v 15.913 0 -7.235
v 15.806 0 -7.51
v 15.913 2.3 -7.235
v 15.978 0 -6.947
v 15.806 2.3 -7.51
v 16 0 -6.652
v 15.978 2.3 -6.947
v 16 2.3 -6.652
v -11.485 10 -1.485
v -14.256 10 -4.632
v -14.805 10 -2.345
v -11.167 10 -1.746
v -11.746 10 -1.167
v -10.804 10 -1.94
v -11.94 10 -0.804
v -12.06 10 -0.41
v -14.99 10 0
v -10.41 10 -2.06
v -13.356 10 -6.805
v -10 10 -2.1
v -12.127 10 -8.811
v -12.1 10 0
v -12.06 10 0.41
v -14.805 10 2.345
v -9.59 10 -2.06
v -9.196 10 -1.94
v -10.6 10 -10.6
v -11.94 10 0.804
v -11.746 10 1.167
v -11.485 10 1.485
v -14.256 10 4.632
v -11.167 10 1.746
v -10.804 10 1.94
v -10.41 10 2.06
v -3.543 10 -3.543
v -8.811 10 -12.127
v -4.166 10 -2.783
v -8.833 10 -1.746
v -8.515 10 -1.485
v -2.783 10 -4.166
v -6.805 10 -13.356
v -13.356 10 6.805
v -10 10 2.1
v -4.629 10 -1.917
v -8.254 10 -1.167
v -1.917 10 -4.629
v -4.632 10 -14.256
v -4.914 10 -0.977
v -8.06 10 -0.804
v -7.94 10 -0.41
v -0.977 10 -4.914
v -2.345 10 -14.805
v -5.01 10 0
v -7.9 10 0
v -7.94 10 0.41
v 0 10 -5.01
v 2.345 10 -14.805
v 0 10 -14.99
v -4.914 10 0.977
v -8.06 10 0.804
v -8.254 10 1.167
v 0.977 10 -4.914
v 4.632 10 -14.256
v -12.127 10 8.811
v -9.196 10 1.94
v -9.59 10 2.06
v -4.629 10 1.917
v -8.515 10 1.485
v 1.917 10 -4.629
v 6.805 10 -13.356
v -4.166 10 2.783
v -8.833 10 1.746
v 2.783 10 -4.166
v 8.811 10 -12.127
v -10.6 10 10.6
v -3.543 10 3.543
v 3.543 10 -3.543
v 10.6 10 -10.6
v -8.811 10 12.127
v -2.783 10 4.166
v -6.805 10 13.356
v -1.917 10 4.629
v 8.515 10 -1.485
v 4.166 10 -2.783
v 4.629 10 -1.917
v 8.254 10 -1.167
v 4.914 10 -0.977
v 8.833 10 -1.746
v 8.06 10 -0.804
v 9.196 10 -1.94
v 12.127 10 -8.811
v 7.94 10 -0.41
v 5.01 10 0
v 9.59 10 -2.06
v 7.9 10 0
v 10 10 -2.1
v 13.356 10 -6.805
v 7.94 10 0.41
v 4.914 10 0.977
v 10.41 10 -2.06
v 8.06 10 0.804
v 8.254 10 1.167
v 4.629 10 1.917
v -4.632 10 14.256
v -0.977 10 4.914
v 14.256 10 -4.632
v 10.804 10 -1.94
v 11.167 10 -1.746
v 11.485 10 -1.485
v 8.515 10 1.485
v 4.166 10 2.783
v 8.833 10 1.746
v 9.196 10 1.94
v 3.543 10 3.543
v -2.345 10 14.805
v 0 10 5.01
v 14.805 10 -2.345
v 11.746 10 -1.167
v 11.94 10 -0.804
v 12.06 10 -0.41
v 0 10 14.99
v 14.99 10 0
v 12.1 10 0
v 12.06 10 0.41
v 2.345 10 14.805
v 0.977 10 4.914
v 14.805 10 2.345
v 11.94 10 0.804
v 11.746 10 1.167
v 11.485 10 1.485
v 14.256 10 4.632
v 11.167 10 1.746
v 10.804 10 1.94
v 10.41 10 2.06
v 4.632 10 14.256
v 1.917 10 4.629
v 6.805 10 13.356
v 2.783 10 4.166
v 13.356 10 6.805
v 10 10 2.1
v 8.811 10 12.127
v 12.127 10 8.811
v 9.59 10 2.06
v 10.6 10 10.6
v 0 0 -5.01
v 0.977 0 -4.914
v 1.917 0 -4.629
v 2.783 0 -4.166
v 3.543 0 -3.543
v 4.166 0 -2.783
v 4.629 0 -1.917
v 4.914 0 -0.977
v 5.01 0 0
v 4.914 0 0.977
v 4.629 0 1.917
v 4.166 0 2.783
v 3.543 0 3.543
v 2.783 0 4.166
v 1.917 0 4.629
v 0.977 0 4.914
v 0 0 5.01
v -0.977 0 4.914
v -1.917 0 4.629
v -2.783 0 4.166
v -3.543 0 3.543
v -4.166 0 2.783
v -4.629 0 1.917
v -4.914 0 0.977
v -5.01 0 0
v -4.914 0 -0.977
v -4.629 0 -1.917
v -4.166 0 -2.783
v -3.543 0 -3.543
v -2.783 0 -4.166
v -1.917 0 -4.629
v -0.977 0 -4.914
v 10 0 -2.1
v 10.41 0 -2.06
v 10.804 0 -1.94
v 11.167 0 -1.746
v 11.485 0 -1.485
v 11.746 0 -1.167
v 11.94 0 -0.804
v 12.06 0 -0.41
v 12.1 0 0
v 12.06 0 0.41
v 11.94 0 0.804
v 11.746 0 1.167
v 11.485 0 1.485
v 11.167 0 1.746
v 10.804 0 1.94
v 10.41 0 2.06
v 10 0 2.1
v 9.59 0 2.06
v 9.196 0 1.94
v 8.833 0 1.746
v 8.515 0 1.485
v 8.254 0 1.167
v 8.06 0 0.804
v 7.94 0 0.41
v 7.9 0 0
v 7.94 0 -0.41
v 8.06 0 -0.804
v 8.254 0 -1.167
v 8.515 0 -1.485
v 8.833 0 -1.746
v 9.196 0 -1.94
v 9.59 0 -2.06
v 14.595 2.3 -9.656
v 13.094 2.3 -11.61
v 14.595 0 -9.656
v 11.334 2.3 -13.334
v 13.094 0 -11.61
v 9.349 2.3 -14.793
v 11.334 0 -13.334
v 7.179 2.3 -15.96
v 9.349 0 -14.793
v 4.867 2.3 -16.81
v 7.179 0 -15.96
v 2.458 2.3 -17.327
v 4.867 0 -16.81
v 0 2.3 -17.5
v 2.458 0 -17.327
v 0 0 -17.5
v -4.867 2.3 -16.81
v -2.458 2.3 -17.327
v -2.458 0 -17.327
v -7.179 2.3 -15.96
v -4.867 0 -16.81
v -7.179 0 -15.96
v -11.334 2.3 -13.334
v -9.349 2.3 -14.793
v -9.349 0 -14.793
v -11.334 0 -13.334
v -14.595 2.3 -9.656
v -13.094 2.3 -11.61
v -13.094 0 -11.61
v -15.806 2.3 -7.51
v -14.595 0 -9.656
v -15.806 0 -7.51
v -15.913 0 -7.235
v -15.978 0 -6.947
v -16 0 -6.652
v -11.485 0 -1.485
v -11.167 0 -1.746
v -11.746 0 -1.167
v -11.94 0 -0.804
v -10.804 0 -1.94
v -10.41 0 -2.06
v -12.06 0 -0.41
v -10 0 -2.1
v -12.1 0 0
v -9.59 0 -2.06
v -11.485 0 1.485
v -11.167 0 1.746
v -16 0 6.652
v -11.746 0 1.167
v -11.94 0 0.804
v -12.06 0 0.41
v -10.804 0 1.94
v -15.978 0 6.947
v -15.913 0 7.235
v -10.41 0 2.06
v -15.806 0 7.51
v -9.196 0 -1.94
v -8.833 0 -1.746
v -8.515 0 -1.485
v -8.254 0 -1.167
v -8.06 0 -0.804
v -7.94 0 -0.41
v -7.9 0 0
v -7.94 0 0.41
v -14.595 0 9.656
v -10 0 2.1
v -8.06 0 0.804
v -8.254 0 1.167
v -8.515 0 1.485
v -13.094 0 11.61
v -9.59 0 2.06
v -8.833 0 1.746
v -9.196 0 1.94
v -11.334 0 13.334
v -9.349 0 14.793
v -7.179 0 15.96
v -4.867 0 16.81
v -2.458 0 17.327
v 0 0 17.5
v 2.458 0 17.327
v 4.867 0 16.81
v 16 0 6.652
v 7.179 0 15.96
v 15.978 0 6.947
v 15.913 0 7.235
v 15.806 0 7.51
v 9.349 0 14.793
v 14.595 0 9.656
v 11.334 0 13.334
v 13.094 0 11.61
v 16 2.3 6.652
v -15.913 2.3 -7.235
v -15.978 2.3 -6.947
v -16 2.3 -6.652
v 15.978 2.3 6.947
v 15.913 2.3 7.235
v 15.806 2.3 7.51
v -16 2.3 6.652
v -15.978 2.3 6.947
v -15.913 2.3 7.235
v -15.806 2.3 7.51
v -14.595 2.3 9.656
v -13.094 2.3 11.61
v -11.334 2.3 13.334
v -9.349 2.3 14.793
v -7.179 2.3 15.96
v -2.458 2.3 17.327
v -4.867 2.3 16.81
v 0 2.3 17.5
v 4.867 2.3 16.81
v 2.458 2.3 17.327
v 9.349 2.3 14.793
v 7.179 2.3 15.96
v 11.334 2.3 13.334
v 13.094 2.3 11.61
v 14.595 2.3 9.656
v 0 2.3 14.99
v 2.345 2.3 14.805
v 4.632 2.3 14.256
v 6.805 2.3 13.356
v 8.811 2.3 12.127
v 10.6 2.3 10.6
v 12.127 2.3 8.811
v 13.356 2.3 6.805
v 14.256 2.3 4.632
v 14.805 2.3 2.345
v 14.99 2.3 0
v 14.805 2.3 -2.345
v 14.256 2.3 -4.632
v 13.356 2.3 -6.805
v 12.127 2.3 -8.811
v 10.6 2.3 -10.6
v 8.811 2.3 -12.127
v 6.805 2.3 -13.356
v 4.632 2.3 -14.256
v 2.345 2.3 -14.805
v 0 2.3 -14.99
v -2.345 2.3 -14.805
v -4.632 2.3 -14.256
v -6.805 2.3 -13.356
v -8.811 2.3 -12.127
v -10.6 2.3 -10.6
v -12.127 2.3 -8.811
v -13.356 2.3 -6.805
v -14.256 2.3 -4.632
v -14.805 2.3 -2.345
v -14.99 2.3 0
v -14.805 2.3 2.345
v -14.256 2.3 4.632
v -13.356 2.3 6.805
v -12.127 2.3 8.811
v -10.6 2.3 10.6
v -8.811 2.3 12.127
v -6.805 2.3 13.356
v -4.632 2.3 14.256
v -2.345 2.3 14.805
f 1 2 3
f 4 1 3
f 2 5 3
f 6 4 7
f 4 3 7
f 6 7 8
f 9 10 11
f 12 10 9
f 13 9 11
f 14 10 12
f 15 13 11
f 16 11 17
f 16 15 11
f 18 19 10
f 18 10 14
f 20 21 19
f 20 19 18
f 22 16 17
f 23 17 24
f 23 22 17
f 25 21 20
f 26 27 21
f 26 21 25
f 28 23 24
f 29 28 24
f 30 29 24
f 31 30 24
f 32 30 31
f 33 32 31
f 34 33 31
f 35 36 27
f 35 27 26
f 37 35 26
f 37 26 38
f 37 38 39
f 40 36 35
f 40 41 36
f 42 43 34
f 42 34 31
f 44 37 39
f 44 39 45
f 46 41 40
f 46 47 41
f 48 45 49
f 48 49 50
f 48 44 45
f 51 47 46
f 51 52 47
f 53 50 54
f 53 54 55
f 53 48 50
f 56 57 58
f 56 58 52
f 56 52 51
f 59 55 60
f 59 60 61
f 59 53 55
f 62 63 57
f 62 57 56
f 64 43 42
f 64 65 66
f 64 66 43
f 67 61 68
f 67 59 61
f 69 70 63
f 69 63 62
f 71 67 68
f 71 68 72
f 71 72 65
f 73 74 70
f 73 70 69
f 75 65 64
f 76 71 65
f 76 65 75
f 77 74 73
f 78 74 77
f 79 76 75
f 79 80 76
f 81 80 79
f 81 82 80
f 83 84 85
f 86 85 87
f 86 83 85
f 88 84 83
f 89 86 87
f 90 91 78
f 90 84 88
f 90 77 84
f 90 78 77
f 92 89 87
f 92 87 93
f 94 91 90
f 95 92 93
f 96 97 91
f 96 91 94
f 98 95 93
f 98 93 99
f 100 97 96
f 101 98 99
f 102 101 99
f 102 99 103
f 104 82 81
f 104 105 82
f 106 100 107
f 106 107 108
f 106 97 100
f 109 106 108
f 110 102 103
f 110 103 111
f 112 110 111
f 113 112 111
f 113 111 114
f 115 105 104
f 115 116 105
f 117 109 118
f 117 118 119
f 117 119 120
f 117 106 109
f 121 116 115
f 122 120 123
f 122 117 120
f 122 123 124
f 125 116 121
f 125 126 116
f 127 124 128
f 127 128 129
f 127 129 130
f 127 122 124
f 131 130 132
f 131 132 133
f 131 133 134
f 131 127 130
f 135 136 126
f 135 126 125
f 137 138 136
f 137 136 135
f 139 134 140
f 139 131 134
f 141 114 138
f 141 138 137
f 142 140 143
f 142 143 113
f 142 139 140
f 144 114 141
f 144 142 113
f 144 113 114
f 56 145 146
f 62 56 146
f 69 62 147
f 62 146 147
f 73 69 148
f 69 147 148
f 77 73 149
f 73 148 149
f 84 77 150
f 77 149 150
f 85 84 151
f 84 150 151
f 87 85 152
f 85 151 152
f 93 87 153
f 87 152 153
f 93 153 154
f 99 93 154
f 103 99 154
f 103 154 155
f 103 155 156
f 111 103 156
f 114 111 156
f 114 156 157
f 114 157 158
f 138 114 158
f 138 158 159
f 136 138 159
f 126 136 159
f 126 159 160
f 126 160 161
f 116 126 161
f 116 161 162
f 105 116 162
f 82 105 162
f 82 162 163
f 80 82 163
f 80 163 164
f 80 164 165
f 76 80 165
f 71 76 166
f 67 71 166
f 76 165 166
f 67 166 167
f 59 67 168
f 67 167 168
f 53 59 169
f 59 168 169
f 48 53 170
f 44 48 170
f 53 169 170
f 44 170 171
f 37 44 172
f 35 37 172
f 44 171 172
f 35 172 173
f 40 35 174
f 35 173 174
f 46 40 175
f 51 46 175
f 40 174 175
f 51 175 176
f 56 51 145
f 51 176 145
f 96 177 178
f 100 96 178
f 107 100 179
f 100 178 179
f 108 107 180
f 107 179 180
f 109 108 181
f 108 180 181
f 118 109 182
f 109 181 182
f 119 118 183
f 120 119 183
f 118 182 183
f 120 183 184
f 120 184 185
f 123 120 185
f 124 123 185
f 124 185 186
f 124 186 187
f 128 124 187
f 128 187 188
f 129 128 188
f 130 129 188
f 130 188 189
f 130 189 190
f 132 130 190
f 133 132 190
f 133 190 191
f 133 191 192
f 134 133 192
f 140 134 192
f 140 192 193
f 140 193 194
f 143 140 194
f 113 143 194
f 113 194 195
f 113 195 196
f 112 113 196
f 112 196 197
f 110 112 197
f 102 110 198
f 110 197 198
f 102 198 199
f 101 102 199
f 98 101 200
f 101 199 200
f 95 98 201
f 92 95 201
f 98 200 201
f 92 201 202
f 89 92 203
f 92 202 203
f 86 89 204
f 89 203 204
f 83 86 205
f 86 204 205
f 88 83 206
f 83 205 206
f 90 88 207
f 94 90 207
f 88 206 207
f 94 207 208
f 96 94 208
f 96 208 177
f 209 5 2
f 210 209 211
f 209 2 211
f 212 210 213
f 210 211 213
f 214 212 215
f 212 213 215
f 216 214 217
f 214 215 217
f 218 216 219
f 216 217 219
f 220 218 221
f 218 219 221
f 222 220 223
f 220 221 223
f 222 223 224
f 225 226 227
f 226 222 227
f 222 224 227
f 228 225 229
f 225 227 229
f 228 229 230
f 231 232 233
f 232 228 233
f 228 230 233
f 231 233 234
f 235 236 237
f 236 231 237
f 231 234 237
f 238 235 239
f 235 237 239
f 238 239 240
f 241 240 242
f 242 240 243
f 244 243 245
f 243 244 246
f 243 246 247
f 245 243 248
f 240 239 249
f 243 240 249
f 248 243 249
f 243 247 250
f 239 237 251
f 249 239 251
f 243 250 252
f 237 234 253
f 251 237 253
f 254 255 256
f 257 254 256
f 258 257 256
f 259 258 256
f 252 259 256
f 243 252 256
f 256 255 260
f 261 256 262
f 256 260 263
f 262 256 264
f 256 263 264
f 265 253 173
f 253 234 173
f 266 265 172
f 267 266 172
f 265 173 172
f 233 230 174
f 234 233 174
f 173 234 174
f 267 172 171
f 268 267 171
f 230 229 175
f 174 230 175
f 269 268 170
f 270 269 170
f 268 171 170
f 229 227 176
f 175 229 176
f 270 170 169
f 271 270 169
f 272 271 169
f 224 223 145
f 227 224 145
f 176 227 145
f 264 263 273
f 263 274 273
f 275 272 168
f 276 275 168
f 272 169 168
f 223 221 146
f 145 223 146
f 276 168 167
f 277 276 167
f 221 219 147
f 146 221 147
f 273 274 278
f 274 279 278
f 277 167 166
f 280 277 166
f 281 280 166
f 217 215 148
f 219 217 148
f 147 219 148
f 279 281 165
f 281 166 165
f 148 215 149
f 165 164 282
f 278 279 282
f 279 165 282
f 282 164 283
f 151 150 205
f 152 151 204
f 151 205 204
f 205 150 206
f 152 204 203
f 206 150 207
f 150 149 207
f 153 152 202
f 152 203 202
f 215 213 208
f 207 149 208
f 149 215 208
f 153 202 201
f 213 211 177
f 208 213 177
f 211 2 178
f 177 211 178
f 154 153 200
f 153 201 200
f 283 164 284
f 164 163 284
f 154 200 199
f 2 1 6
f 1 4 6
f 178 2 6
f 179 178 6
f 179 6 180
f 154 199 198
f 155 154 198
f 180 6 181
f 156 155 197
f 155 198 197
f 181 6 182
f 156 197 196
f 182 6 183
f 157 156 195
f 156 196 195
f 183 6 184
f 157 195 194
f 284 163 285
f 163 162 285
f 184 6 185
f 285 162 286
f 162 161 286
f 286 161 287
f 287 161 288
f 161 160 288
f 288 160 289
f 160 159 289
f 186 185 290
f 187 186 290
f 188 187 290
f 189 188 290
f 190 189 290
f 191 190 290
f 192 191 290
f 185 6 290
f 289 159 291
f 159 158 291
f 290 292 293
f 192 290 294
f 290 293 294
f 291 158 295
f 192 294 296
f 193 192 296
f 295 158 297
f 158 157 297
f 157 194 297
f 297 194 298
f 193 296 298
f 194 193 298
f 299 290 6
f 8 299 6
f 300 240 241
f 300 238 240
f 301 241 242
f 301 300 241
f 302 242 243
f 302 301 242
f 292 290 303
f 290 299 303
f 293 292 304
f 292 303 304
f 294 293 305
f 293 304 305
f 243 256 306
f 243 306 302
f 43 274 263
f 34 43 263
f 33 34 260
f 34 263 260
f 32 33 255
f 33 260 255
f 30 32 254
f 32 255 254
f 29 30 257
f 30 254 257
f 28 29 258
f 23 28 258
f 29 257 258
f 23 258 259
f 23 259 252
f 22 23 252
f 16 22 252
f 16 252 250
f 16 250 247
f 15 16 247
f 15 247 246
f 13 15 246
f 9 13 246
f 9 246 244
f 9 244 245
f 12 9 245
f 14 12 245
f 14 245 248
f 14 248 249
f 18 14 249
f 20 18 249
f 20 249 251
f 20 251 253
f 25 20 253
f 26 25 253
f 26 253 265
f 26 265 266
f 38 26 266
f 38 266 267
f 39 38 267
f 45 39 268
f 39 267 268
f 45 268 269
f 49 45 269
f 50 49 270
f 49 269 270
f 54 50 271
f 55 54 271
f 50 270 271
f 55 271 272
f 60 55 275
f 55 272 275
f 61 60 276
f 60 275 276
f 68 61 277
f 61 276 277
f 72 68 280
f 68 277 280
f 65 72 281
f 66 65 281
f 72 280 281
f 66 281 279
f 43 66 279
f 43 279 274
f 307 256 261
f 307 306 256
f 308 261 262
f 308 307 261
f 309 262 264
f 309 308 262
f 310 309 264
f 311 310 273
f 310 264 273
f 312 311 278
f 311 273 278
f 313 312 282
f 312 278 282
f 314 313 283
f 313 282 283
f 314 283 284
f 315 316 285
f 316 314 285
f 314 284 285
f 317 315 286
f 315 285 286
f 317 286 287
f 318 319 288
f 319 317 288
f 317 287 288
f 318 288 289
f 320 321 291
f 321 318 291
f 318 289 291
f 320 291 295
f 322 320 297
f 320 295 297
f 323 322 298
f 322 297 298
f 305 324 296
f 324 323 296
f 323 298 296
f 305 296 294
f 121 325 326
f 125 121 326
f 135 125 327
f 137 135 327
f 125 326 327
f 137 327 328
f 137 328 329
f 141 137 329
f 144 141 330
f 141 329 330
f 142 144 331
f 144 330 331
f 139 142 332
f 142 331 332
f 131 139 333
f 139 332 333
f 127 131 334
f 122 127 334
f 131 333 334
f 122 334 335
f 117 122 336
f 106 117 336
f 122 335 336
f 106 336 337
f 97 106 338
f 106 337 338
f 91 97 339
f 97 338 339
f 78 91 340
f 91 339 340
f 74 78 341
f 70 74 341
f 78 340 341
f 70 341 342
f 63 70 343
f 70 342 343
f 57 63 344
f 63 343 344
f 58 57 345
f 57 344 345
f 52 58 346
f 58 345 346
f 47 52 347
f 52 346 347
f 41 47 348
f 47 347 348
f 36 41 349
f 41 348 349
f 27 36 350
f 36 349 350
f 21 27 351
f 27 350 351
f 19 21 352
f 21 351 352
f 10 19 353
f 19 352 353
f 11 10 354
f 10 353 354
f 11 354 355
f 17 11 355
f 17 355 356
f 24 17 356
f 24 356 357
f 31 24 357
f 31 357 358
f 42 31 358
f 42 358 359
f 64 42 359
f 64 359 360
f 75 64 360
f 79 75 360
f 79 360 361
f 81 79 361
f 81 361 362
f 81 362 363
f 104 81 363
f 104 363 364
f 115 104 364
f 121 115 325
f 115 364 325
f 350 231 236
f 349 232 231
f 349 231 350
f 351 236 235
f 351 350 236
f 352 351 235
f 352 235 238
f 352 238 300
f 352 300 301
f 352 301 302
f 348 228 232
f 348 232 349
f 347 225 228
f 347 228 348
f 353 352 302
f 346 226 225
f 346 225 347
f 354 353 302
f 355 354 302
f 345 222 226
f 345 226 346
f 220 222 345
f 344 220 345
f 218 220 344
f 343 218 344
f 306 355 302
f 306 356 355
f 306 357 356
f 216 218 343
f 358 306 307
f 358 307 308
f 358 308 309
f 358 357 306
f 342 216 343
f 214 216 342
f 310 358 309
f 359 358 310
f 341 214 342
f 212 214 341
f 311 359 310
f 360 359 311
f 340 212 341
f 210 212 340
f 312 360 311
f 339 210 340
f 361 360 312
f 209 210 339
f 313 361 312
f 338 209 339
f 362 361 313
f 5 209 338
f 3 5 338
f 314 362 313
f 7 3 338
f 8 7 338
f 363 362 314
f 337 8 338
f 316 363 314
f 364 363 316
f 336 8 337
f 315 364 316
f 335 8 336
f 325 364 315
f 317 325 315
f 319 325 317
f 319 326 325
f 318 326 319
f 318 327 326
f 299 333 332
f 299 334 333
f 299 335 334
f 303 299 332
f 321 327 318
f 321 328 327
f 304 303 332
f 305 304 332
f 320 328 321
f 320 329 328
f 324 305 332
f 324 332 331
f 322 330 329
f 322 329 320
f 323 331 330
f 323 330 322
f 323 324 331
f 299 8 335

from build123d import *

# Parameters (mm, degrees)
SKETCH_1_R          = 17.5
EXTRUDE_1_DEPTH     = 2.3
SKETCH_2_R          = 14.99
EXTRUDE_2_DEPTH     = 7.7
CUT_EXTRUDE_1_REACH = 28.693
SKETCH_3_R          = 5.01
SKETCH_3_R_2        = 2.1
FILLET_1_R          = 2


with BuildPart() as part:
    # ｽｹｯﾁ1 → ﾎﾞｽ - 押し出し1 (new body)
    with BuildSketch(Plane(origin=(0, 0, 0), x_dir=(1, 0, 0), z_dir=(0, 1, 0))):
        with Locations(Location((0, 0, 0), (0, 0, 270))):
            Circle(SKETCH_1_R)
    extrude(amount=EXTRUDE_1_DEPTH)

    # ｽｹｯﾁ2 → ﾎﾞｽ - 押し出し2 (add)
    with BuildSketch(Plane(origin=(0, 2.3, 0), x_dir=(1, 0, 0), z_dir=(0, 1, 0))):
        with Locations(Location((0, 0, 0), (0, 0, 270))):
            Circle(SKETCH_2_R)
    extrude(amount=EXTRUDE_2_DEPTH)

    # ｶｯﾄ - 押し出し1: up to this face of the body (flat: up to its plane)
    cut_extrude_1_end = Plane(part.part.faces().sort_by_distance((0, 10, 0))[0])
    # ｽｹｯﾁ3 → ｶｯﾄ - 押し出し1 (cut, up to the picked face)
    with BuildSketch(Plane.XZ, mode=Mode.PRIVATE) as cut_extrude_1_sk1:
        with Locations(Location((0, 0, 0), (0, 0, 270))):
            Circle(SKETCH_3_R)
    cut_extrude_1_tool1 = split(extrude(cut_extrude_1_sk1.sketch, amount=-CUT_EXTRUDE_1_REACH, mode=Mode.PRIVATE), bisect_by=cut_extrude_1_end, keep=Keep.BOTH, mode=Mode.PRIVATE)
    # ｽｹｯﾁ3 → ｶｯﾄ - 押し出し1 (cut, up to the picked face)
    with BuildSketch(Plane.XZ, mode=Mode.PRIVATE) as cut_extrude_1_sk2:
        with Locations(Location((10, 0, 0), (0, 0, 270))):
            Circle(SKETCH_3_R_2)
    cut_extrude_1_tool2 = split(extrude(cut_extrude_1_sk2.sketch, amount=-CUT_EXTRUDE_1_REACH, mode=Mode.PRIVATE), bisect_by=cut_extrude_1_end, keep=Keep.BOTH, mode=Mode.PRIVATE)
    # ｽｹｯﾁ3 → ｶｯﾄ - 押し出し1 (cut, up to the picked face)
    with BuildSketch(Plane.XZ, mode=Mode.PRIVATE) as cut_extrude_1_sk3:
        with Locations(Location((-10, 0, 0), (0, 0, 90))):
            Circle(SKETCH_3_R_2)
    cut_extrude_1_tool3 = split(extrude(cut_extrude_1_sk3.sketch, amount=-CUT_EXTRUDE_1_REACH, mode=Mode.PRIVATE), bisect_by=cut_extrude_1_end, keep=Keep.BOTH, mode=Mode.PRIVATE)
    # ｽｹｯﾁ3 → ｶｯﾄ - 押し出し1 (cut, up to the picked face)
    with BuildSketch(Plane.XZ, mode=Mode.PRIVATE) as cut_extrude_1_sk4:
        with BuildLine():
            Line((16, 7.088723439), (16, -7.088723439))
            ThreePointArc((16, -7.088723439), (17.5, 0), (16, 7.088723439))
        make_face()
    cut_extrude_1_tool4 = split(extrude(cut_extrude_1_sk4.sketch, amount=-CUT_EXTRUDE_1_REACH, mode=Mode.PRIVATE), bisect_by=cut_extrude_1_end, keep=Keep.BOTH, mode=Mode.PRIVATE)
    # ｽｹｯﾁ3 → ｶｯﾄ - 押し出し1 (cut, up to the picked face)
    with BuildSketch(Plane.XZ, mode=Mode.PRIVATE) as cut_extrude_1_sk5:
        with BuildLine():
            Line((-16, 7.088723439), (-16, -7.088723439))
            ThreePointArc((-16, -7.088723439), (-17.5, 0), (-16, 7.088723439))
        make_face()
    cut_extrude_1_tool5 = split(extrude(cut_extrude_1_sk5.sketch, amount=-CUT_EXTRUDE_1_REACH, mode=Mode.PRIVATE), bisect_by=cut_extrude_1_end, keep=Keep.BOTH, mode=Mode.PRIVATE)
    add(cut_extrude_1_tool1.solids().sort_by(Axis((0, 0, 0), (0, 1, 0)))[0], mode=Mode.SUBTRACT)
    add(cut_extrude_1_tool2.solids().sort_by(Axis((10, 0, 0), (0, 1, 0)))[0], mode=Mode.SUBTRACT)
    add(cut_extrude_1_tool3.solids().sort_by(Axis((-10, 0, 0), (0, 1, 0)))[0], mode=Mode.SUBTRACT)
    add(cut_extrude_1_tool4.solids().sort_by(Axis((16.60226, 0, 0), (0, 1, 0)))[0], mode=Mode.SUBTRACT)
    add(cut_extrude_1_tool5.solids().sort_by(Axis((-16.60226, 0, 0), (0, 1, 0)))[0], mode=Mode.SUBTRACT)

    # ﾌｨﾚｯﾄ1
    fillet_1_edges = [part.edges().sort_by_distance(p)[0] for p in [
        (-16, 1.15, 7.088723439),
        (-16, 1.15, -7.088723439),
        (16, 1.15, -7.088723439),
        (16, 1.15, 7.088723439),
    ]]
    fillet(fillet_1_edges, radius=FILLET_1_R)


solid = part.part
